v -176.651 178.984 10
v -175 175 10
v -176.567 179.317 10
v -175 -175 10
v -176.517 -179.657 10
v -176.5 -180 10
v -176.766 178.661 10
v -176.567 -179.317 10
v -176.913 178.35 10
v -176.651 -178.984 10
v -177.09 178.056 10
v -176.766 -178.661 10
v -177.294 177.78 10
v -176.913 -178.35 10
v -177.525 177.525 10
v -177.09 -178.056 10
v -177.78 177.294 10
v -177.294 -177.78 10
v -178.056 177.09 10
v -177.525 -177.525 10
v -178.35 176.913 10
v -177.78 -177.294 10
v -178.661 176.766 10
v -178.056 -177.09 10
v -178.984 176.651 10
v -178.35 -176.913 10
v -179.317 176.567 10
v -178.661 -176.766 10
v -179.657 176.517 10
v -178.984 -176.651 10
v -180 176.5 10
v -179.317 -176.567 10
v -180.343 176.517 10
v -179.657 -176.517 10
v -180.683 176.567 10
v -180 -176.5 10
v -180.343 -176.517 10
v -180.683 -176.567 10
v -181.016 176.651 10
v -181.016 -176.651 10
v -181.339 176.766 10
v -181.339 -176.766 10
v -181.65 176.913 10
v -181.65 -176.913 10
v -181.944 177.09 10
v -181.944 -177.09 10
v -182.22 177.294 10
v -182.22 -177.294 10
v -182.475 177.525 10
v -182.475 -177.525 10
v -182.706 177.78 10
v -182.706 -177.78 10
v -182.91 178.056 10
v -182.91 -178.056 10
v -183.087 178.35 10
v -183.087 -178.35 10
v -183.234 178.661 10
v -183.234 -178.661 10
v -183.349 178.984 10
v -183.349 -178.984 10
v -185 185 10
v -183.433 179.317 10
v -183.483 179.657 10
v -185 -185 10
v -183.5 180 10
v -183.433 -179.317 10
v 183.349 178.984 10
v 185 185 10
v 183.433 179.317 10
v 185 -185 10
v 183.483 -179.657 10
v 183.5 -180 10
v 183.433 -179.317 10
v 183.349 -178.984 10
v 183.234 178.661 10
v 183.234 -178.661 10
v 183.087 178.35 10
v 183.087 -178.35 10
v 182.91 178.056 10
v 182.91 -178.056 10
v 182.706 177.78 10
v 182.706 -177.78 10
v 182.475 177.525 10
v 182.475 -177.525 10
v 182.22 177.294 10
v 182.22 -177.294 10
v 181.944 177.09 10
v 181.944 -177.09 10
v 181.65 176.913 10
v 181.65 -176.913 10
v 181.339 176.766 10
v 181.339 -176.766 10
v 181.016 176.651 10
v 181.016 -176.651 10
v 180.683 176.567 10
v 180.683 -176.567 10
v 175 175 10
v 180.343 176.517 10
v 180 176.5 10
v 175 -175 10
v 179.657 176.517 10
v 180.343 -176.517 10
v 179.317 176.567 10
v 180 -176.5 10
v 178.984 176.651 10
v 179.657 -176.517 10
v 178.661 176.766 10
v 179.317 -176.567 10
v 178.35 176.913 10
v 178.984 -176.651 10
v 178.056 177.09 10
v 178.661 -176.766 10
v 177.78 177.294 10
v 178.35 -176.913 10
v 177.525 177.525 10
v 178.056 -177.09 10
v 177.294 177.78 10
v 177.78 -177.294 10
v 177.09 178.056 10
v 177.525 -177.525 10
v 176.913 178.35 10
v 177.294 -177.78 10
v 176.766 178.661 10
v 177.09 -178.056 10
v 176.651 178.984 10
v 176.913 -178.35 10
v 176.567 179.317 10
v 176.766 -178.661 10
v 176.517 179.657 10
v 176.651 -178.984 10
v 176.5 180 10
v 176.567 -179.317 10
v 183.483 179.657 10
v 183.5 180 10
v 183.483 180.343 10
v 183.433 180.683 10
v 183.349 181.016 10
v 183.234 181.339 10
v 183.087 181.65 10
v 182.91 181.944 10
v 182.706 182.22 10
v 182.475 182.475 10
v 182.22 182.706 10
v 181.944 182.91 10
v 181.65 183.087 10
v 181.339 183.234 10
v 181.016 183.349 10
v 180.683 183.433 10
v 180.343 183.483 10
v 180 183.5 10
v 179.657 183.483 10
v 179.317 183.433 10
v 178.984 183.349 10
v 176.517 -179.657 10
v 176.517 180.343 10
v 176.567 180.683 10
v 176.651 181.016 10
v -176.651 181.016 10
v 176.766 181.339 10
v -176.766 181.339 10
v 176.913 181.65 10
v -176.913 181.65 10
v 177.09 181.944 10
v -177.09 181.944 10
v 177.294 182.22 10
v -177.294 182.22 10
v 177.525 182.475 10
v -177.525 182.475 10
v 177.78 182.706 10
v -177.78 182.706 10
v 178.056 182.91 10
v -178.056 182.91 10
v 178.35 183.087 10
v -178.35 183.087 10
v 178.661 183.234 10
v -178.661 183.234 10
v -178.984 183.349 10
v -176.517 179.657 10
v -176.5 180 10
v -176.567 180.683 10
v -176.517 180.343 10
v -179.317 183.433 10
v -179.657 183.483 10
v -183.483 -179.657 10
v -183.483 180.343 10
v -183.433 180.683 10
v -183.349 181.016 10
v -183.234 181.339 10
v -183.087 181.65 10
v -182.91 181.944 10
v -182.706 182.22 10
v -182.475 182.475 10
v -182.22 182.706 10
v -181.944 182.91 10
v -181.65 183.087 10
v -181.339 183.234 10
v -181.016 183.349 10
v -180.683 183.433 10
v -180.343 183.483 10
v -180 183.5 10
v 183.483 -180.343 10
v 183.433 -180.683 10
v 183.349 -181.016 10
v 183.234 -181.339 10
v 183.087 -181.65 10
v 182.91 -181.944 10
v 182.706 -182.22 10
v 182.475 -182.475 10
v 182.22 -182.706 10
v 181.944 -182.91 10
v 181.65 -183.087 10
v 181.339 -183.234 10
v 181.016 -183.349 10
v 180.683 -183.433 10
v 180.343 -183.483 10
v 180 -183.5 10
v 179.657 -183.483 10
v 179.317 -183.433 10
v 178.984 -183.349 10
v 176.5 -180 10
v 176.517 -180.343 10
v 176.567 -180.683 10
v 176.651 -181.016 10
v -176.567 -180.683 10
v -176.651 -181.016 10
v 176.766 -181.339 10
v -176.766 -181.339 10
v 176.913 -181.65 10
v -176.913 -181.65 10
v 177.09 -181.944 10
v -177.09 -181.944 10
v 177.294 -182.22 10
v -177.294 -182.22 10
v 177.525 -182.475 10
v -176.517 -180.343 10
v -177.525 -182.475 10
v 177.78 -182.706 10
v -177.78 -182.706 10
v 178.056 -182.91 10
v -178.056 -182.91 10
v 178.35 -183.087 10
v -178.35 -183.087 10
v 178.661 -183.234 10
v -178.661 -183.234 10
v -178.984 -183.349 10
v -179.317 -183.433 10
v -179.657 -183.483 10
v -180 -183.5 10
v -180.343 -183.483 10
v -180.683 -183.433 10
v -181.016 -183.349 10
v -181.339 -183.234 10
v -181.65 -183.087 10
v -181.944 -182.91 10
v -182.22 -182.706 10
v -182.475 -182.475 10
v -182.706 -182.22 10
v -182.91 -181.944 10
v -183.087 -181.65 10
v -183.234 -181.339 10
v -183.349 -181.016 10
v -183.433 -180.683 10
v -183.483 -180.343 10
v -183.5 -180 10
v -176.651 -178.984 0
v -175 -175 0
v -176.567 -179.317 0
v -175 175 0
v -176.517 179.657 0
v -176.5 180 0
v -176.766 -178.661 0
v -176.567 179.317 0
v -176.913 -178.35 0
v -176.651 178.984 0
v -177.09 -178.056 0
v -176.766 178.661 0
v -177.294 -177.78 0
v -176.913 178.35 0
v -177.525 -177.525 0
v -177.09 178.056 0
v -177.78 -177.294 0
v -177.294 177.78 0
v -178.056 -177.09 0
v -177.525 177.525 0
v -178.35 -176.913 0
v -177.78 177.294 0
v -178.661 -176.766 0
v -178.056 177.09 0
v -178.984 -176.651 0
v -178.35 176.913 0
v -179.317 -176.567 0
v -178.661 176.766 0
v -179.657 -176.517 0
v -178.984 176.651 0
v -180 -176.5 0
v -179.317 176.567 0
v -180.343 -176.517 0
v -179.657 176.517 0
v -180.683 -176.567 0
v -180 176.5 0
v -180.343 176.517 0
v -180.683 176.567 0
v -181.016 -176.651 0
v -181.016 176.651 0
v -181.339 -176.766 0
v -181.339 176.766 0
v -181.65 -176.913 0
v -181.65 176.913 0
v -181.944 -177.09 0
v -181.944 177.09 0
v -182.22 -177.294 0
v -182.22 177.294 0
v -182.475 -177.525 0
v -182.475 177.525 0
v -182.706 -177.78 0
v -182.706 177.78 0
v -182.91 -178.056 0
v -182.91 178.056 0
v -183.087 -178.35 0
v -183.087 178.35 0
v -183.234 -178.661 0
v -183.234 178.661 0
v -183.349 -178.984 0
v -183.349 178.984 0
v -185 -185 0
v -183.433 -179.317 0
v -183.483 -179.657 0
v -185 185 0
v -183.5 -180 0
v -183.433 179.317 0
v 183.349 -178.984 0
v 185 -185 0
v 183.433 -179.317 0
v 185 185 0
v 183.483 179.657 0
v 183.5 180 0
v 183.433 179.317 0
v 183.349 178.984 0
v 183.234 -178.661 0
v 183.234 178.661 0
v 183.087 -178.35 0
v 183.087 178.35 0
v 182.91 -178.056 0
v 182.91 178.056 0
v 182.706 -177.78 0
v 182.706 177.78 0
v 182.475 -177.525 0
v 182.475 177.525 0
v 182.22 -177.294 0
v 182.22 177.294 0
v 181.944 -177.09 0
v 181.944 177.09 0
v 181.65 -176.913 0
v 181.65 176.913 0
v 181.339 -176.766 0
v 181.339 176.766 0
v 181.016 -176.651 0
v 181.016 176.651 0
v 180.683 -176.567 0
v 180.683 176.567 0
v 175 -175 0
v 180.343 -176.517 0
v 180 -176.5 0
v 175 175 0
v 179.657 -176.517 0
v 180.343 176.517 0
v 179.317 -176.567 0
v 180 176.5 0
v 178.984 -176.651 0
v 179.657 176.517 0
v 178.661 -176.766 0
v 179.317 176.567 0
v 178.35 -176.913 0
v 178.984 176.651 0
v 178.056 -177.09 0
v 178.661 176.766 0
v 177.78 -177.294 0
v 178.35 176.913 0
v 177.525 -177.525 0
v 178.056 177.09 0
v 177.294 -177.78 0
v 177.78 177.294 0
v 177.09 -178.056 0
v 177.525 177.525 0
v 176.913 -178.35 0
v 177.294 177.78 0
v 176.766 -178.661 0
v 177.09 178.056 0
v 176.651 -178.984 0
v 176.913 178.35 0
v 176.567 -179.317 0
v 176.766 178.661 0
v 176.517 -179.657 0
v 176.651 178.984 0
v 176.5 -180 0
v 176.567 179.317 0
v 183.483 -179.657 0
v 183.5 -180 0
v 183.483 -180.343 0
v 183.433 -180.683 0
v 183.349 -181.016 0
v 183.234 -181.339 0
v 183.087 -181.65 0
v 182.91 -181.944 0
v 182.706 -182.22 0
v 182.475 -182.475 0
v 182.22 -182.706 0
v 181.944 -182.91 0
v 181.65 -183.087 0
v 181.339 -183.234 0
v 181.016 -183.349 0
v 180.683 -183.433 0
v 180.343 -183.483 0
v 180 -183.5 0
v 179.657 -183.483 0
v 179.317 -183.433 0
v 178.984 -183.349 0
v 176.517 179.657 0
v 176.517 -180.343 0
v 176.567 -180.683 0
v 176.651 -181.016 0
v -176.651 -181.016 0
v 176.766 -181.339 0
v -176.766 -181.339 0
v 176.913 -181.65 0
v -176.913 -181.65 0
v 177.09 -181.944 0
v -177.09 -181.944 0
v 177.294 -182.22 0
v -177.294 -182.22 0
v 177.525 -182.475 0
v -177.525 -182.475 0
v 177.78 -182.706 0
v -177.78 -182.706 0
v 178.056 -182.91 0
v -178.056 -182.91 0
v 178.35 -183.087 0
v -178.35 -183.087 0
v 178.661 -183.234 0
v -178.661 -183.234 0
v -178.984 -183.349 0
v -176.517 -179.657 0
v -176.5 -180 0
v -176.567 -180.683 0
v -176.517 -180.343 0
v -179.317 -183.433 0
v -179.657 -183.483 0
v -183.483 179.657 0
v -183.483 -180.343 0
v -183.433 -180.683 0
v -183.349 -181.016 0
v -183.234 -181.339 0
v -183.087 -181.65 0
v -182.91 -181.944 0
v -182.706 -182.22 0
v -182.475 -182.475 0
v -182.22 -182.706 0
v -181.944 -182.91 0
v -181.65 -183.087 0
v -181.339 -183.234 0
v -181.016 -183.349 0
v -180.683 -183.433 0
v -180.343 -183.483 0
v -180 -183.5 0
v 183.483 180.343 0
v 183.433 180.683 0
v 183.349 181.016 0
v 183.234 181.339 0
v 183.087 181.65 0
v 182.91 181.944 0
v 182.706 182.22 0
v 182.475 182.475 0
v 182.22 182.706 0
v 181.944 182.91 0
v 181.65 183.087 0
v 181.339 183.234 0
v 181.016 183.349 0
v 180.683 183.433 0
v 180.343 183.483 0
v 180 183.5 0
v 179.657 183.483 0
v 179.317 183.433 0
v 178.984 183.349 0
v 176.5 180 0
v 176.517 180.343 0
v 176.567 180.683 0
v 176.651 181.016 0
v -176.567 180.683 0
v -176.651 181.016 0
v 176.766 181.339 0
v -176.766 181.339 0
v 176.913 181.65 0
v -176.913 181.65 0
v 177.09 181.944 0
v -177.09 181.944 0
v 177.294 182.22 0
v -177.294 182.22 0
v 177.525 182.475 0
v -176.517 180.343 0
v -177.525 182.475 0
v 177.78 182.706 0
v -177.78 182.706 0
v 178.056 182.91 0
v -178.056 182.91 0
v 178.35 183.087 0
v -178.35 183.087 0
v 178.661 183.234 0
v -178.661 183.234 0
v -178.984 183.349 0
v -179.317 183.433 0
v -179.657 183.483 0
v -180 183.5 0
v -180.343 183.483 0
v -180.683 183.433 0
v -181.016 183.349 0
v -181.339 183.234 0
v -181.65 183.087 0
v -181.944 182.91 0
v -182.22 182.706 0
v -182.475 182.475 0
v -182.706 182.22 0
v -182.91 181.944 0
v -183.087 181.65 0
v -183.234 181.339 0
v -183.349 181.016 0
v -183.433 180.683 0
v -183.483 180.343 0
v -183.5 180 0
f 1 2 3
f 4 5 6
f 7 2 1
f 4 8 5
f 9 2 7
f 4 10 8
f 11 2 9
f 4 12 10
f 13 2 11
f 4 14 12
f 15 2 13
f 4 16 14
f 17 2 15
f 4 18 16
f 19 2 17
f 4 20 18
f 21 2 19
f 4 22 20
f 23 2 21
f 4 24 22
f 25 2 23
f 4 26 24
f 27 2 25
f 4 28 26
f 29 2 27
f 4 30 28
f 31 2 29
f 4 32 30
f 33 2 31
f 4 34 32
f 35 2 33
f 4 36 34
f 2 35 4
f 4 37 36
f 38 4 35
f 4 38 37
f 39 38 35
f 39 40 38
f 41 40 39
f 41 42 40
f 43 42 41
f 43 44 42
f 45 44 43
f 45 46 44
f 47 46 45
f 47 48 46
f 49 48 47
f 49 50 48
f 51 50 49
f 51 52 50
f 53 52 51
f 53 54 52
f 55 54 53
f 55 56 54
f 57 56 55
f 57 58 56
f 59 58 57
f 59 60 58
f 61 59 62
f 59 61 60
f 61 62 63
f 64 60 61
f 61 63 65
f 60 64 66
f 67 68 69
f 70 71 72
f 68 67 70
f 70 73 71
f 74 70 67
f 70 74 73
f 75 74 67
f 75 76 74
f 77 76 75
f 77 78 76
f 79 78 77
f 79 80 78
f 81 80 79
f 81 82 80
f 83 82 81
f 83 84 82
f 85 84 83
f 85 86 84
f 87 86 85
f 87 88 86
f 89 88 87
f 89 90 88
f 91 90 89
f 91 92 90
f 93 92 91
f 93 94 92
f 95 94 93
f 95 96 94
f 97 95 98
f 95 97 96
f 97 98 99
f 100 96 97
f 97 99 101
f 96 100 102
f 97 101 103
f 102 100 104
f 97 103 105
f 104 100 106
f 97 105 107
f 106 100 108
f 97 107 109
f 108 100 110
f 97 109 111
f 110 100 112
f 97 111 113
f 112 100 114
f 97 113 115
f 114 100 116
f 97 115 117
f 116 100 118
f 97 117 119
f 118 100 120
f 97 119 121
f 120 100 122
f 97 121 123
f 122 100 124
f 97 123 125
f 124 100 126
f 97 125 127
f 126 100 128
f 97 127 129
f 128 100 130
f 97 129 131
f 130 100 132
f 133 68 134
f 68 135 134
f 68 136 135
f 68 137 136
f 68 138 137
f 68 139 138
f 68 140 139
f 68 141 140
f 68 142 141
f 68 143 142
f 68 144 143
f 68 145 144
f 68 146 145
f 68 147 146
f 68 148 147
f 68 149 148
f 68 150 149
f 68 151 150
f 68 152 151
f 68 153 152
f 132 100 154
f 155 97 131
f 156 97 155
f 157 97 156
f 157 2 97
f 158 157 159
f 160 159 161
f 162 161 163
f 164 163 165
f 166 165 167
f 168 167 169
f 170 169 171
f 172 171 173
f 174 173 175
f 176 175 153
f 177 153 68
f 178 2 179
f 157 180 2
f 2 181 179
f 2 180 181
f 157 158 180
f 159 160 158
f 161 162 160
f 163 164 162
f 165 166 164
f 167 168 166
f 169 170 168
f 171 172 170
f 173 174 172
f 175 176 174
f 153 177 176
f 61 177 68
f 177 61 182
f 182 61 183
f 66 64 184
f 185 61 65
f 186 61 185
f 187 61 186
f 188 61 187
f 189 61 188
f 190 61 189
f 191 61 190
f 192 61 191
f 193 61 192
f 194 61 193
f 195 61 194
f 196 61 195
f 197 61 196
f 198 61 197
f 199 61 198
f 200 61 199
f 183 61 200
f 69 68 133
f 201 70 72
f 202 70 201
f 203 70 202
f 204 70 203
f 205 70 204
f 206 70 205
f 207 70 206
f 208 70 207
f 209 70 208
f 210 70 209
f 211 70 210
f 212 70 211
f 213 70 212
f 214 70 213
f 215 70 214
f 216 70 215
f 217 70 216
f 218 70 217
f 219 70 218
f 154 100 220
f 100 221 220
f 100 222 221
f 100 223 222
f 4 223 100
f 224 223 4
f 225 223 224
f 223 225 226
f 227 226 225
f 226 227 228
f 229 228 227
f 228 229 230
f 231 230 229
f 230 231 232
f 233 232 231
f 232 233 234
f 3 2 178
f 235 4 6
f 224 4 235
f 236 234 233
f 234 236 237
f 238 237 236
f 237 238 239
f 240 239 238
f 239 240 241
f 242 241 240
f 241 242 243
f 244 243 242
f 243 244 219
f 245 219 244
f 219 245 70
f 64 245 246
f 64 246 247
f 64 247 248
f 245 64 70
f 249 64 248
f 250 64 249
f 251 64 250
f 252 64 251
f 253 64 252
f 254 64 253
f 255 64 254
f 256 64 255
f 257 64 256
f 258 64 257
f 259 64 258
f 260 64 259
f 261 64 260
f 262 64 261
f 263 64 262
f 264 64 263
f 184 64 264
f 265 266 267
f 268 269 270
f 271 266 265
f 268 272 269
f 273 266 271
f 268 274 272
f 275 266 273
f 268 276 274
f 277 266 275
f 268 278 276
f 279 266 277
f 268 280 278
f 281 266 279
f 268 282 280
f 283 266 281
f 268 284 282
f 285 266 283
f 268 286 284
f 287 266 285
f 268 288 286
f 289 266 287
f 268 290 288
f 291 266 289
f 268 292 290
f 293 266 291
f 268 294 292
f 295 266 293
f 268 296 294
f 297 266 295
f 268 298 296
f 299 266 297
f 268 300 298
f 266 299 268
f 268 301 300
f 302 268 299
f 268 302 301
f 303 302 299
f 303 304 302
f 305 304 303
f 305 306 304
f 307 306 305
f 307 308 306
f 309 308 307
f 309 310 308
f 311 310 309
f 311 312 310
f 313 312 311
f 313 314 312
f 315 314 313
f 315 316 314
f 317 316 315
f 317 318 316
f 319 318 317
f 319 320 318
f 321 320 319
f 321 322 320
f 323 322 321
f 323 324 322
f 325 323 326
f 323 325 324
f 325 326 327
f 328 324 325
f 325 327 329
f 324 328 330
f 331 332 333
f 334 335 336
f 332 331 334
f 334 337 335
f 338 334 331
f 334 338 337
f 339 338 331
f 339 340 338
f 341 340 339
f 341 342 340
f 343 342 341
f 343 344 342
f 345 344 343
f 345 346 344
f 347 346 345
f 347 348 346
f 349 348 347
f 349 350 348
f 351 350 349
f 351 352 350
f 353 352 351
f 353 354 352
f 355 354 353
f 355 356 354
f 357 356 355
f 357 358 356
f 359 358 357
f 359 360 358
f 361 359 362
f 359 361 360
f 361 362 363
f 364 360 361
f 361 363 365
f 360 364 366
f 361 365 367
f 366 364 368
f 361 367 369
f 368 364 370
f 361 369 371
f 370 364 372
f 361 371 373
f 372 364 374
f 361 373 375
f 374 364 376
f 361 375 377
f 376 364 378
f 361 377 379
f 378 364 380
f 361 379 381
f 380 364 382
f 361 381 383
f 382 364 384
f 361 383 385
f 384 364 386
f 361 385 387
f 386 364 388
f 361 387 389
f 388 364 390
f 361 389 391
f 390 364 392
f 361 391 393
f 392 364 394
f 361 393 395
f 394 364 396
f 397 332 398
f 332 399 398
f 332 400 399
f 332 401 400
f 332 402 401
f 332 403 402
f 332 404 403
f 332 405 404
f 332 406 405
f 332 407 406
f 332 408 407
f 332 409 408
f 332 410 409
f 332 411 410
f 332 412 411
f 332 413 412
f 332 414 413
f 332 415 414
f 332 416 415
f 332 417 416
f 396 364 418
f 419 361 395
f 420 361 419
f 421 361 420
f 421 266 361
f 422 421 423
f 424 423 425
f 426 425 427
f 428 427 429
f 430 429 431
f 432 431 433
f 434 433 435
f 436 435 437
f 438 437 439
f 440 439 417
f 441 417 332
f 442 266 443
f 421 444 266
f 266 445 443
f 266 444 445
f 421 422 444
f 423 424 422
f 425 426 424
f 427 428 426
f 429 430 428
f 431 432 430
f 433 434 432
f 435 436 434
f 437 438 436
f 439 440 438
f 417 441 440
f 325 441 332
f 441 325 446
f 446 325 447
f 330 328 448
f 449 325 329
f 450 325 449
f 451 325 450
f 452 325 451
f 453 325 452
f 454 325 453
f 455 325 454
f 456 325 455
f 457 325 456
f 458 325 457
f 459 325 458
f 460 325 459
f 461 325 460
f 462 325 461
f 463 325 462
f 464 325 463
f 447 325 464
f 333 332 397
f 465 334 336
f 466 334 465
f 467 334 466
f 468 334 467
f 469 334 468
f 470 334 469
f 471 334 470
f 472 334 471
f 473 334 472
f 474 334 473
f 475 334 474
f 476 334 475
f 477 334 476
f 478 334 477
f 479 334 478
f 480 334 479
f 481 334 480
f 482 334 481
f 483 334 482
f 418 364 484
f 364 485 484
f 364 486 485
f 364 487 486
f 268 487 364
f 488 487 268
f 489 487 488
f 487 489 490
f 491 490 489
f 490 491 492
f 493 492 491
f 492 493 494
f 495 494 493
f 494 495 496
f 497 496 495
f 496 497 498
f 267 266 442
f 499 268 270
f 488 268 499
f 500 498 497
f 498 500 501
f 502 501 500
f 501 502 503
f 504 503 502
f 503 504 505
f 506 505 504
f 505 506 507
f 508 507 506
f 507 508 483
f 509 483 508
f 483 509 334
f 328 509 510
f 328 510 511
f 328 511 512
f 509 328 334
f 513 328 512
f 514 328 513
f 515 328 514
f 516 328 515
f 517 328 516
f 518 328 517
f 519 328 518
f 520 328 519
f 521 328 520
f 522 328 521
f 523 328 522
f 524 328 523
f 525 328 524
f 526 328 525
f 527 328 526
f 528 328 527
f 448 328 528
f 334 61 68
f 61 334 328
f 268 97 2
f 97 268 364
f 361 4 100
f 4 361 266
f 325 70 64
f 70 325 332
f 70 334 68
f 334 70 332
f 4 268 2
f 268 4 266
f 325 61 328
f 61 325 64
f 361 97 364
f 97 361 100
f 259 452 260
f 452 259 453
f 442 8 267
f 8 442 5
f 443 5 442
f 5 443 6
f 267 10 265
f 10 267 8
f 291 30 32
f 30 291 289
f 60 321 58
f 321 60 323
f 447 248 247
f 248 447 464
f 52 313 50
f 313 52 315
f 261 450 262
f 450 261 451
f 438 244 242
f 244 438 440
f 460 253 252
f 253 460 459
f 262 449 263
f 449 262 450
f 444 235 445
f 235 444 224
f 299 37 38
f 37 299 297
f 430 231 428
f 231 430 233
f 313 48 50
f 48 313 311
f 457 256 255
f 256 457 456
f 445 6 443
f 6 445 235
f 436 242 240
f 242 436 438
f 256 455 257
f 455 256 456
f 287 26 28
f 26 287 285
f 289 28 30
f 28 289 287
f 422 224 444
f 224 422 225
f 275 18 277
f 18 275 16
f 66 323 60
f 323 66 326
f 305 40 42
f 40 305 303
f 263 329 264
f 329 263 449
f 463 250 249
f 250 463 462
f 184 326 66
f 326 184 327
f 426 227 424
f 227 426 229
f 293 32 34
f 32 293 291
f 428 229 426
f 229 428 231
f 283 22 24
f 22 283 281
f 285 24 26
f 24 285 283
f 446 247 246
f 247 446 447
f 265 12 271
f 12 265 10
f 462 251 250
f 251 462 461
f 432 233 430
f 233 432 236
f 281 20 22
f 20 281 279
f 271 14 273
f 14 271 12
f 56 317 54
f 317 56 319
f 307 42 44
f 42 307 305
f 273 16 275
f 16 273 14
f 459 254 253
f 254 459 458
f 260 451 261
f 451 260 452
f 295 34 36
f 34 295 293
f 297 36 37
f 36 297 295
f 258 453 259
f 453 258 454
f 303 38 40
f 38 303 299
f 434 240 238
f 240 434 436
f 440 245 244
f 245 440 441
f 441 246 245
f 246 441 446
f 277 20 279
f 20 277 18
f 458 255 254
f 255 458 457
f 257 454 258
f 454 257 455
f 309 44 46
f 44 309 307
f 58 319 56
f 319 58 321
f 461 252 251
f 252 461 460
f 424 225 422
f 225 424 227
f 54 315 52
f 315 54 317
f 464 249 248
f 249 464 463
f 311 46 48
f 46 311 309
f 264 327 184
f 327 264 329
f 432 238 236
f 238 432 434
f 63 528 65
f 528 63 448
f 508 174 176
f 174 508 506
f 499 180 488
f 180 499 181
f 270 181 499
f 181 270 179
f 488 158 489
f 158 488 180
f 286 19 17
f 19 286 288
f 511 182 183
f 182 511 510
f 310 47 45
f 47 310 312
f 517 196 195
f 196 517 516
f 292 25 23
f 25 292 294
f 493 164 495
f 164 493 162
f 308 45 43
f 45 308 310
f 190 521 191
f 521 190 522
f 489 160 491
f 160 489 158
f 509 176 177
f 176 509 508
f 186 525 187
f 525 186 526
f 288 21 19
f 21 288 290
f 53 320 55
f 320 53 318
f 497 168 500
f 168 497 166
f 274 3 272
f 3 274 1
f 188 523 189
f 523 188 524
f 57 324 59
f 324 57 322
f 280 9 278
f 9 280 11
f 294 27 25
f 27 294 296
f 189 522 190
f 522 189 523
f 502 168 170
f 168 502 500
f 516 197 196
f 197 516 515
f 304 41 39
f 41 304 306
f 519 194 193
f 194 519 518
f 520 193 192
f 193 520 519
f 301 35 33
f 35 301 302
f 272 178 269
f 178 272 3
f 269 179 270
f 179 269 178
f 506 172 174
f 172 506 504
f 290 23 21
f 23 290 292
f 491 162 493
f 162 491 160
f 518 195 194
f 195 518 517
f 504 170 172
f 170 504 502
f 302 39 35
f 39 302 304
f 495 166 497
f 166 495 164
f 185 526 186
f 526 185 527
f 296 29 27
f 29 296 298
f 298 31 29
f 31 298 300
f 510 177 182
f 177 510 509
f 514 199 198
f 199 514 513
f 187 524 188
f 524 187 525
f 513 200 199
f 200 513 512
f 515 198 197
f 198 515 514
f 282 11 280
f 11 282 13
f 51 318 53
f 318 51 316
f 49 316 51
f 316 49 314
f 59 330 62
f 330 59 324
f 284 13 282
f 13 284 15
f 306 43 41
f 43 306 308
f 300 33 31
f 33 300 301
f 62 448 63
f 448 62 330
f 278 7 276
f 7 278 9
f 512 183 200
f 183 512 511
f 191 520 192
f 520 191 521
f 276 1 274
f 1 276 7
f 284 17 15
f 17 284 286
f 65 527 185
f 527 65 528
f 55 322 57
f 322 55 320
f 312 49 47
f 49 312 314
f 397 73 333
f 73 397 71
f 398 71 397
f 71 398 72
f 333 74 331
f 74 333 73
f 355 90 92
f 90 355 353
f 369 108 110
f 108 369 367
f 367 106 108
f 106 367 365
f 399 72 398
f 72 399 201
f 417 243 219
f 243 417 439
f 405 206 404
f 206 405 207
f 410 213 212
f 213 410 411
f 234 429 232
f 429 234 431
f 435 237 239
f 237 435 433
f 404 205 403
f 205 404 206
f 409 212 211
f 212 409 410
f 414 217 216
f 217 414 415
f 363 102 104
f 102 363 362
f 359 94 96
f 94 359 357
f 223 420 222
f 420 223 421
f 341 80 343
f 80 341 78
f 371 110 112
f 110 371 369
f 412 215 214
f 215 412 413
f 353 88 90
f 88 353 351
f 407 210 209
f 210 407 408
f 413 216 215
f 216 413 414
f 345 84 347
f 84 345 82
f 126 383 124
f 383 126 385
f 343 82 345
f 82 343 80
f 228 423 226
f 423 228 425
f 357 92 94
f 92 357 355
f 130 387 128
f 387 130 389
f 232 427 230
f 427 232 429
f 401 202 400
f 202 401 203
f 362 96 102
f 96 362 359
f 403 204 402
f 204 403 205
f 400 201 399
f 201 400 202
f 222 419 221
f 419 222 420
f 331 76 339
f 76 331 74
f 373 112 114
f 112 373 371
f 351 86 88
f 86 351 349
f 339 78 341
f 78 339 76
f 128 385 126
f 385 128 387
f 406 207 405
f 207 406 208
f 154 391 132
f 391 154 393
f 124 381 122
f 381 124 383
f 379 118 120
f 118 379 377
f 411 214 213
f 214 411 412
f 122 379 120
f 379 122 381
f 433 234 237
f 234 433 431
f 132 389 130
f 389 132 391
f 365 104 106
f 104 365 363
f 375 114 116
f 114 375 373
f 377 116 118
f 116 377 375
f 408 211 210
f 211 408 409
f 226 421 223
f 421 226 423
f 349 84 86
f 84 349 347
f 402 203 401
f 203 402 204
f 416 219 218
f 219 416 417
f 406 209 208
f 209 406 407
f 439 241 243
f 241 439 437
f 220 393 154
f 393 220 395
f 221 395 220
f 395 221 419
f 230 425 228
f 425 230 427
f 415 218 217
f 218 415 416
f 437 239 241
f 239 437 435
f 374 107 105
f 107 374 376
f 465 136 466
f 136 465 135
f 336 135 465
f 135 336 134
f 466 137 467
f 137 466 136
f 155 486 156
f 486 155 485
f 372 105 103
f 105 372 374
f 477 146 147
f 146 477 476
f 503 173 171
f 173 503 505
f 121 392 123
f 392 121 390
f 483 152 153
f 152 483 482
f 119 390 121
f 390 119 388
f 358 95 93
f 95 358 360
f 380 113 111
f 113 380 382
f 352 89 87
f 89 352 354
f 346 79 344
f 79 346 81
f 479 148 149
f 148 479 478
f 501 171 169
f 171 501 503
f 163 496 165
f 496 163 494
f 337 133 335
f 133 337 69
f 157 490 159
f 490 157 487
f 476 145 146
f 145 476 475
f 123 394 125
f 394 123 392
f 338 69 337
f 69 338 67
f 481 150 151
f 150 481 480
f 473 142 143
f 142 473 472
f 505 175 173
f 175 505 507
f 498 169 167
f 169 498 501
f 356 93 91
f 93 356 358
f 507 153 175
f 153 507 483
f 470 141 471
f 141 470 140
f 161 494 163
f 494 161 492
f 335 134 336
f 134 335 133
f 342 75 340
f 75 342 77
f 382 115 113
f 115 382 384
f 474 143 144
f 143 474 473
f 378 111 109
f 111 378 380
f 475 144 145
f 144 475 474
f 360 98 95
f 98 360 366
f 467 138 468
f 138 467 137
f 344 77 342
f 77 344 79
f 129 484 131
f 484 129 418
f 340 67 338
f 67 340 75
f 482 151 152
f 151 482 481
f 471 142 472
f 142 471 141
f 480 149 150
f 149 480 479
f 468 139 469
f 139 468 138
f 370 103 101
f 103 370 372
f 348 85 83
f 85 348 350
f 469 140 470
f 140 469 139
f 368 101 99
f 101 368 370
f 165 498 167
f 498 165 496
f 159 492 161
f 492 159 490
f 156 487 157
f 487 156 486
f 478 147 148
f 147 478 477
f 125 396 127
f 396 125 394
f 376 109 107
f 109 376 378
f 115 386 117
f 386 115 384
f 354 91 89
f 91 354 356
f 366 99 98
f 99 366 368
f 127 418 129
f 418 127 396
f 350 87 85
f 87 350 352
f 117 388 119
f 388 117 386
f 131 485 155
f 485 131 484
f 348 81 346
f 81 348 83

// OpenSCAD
// ring_15.scad - ring index 15 (z bottom = 150 mm)
$fn = 64; bar = 10; half_b = bar/2; outer = 370; half_outer = outer/2;
front_y = 180; back_y = -180; left_x = -180; right_x = 180;
x_centers = [-170, -100, -30, 40, 110, 180];
z_centers = [5, 85, 155, 225, 295, 365, 435, 505, 575, 645, 715]; ring_z = 150;
module place_box(cx, cy, sx, sy) { translate([cx - sx/2, cy - sy/2, 0]) cube([sx, sy, bar]); }

difference() { union() {
    for (x = x_centers) { place_box(x, front_y, bar, bar); place_box(x, back_y, bar, bar); }
    for (y = x_centers) { place_box(left_x, y, bar, bar); place_box(right_x, y, bar, bar); }
    for (zc = z_centers) if ((zc - half_b < ring_z + bar) && (zc + half_b > ring_z)) {
        translate([-half_outer, front_y - half_b, 0]) cube([outer, bar, bar]);
        translate([-half_outer, back_y - half_b, 0])  cube([outer, bar, bar]);
        translate([left_x - half_b, -half_outer, 0])  cube([bar, outer, bar]);
        translate([right_x - half_b, -half_outer, 0]) cube([bar, outer, bar]);
    }
  }
  for (cx = [-180, 180]) for (cy = [-180, 180]) translate([cx, cy, 0]) cylinder(h = bar, r = 3.5, $fn = 64);
}
